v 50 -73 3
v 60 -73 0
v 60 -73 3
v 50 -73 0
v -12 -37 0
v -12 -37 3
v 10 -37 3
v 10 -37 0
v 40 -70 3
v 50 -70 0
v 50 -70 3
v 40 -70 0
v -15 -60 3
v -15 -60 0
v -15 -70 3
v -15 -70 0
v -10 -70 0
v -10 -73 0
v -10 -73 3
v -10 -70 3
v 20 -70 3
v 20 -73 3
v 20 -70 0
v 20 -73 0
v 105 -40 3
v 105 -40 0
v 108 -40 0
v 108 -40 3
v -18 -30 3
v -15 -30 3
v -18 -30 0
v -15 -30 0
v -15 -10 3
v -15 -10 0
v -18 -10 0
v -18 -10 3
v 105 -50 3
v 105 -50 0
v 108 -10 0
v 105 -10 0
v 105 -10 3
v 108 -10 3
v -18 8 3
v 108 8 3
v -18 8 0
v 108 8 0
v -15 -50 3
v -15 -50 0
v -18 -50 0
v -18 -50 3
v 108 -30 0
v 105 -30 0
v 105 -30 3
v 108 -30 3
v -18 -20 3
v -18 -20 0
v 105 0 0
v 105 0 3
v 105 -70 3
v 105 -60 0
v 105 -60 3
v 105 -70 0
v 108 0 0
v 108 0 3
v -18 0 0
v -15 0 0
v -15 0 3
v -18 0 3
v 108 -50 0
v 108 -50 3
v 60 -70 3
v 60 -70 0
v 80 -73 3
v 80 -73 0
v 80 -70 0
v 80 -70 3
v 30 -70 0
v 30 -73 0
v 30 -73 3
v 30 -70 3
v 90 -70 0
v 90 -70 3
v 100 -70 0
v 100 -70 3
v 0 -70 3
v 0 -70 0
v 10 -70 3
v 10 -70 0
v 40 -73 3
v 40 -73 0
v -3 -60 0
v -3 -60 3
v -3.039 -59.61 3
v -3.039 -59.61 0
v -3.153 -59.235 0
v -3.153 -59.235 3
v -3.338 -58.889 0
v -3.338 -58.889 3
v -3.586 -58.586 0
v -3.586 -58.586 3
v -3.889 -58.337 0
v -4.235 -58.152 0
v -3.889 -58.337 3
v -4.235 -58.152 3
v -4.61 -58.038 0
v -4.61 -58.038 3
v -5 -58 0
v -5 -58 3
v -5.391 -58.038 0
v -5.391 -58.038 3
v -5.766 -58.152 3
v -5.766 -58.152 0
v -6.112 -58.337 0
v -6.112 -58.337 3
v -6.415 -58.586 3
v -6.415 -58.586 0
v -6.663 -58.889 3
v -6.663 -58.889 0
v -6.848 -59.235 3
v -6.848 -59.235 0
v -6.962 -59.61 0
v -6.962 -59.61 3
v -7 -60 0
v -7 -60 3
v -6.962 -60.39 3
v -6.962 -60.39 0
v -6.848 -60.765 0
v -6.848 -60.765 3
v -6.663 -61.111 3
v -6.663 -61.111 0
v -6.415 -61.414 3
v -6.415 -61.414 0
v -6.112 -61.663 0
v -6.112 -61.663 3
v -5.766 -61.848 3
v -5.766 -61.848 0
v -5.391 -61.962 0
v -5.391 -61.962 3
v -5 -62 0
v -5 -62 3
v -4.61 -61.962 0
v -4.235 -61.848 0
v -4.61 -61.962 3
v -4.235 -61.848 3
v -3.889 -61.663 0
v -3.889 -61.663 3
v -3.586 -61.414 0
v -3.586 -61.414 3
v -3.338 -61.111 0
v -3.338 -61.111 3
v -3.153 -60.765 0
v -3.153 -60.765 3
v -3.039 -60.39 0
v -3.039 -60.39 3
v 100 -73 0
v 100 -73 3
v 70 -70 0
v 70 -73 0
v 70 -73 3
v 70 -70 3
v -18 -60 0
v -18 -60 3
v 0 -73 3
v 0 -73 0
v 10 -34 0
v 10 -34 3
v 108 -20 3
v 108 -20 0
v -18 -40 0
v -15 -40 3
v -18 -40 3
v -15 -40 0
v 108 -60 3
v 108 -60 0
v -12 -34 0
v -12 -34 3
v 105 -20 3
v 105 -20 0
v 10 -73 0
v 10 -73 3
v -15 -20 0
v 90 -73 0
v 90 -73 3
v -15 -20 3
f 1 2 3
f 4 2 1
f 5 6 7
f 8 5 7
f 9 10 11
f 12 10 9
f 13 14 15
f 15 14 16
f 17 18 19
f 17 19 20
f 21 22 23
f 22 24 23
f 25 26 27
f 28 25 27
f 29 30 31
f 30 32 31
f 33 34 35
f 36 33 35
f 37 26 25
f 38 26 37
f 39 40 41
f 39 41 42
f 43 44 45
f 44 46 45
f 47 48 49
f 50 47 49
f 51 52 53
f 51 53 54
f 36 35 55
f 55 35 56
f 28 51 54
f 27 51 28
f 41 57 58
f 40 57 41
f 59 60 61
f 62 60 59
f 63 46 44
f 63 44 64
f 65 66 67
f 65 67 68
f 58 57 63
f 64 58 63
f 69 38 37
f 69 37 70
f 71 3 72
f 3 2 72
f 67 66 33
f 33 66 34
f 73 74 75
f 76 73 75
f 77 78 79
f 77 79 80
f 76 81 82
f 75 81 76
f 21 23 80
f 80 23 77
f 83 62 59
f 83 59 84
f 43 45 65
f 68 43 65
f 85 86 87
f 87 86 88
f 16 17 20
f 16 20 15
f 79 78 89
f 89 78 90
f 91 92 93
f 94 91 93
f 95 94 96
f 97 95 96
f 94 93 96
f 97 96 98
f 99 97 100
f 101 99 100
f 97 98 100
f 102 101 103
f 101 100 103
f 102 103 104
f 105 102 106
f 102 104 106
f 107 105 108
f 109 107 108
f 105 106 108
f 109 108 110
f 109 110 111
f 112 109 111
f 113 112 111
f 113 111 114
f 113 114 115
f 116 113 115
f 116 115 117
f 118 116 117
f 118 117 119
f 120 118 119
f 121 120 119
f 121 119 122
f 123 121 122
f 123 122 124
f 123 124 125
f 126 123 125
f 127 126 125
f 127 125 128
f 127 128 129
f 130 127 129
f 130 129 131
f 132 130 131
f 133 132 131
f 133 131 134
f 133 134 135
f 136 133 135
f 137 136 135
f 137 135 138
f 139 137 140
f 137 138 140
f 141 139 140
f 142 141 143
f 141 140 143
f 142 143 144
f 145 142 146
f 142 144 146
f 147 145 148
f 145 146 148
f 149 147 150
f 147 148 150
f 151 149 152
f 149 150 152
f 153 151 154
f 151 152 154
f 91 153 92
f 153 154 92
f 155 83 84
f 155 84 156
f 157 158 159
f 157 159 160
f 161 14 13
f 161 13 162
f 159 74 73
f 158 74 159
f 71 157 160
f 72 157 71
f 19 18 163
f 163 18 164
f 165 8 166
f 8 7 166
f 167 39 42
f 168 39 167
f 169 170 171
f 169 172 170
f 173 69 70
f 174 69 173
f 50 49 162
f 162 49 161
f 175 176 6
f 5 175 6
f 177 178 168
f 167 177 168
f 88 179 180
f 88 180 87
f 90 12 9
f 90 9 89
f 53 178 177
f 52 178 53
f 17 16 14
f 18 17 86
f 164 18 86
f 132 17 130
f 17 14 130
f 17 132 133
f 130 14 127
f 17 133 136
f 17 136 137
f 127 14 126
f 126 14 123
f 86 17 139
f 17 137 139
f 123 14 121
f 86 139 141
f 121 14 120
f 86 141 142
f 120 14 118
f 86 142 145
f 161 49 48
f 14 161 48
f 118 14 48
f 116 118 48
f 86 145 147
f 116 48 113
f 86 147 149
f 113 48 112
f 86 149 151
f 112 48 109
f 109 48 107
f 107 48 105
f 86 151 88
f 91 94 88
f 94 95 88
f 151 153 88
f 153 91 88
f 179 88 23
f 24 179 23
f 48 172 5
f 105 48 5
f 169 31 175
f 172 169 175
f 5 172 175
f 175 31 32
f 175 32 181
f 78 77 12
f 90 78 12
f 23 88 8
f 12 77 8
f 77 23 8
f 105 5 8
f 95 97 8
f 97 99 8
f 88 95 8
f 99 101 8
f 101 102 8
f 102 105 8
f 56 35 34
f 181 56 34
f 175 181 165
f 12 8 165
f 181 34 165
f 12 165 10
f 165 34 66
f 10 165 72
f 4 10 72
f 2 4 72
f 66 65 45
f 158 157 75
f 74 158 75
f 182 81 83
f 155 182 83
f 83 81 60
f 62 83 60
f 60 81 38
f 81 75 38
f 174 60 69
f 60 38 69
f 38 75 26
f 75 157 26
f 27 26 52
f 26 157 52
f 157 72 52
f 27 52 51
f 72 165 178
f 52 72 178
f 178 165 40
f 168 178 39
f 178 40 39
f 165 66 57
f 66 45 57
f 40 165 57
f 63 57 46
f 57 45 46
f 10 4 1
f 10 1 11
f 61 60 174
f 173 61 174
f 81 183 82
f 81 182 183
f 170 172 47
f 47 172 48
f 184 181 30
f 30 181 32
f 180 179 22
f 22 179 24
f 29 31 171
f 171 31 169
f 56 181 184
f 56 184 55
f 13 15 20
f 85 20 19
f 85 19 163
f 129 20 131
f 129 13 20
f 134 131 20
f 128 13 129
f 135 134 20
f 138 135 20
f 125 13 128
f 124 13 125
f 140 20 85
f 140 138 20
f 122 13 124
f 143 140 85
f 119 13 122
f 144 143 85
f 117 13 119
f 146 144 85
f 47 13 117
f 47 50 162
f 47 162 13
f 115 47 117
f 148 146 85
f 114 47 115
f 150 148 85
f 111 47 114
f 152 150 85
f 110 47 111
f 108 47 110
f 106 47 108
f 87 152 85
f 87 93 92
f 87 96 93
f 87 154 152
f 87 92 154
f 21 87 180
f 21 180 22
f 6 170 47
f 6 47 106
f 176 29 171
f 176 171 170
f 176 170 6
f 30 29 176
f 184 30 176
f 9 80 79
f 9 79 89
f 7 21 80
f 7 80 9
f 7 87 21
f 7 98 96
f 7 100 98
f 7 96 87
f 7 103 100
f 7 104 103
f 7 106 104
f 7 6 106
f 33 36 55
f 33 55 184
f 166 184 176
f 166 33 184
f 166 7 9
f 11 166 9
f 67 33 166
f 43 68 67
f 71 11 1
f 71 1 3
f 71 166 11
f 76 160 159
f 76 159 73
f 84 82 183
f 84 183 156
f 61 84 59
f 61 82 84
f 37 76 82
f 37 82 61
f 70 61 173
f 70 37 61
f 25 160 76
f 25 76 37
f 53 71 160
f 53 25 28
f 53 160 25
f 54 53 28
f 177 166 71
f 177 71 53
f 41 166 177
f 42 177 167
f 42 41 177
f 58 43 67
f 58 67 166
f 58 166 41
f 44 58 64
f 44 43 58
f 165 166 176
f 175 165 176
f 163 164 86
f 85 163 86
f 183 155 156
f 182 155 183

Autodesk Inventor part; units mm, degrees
ref_plane "YZ Plane" through (0, 0, 0) normal (1, 0, 0) x (0, 1, 0)
ref_plane "XZ Plane" through (0, 0, 0) normal (0, 1, 0) x (-1, 0, 0)
ref_plane "XY Plane" through (0, 0, 0) normal (0, 0, 1) x (1, 0, 0)
ref_plane "Work Plane2" through (0, 0, 0) normal (0, 0, 1) x (1, 0, 0)
sketch "Sketch2" plane through (0, 0, 0) normal (0, 0, 1) x (1, 0, 0)
  line L0 (-13, 0) -> (-13, 3) projected
  line L1 (-13, 3) -> (-10, 3) projected
  line L2 (103, 0) -> (103, 3) projected
  line L3 (100, 3) -> (103, 3) projected
  line L4 (103, 8) -> (-13, 8)
  line L5 (-10, 0) -> (-10, 3) projected
  line L6 (-10, 3) -> (0, 3) projected
  line L7 (100, 0) -> (100, 3) projected
  line L8 (90, 3) -> (100, 3) projected
  line L9 (90, 3) -> (0, 3)
  line L10 (0, 0) -> (90, 0)
  line L11 (0, 0) -> (0, 3) projected
  line L12 (90, 0) -> (90, 3) projected
  line L13 (90, 3) -> (90, 0)
  line L14 (0, 3) -> (0, 0)
  line L15 (45, 0) -> (45, -20) construction
  line L16 (-15.0005, 0) -> (-15.0005, -10)
  line L17 (-15.0005, -10) -> (-18.0005, -10)
  line L18 (-15.0005, -20) -> (-18.0005, -20)
  line L19 (-15.0005, -20) -> (-15.0005, -30)
  line L20 (-15.0005, -30) -> (-18.0005, -30)
  line L21 (-15.0005, -40) -> (-18.0005, -40)
  line L22 (-15.0005, -50) -> (-18.0005, -50)
  line L23 (-15.0005, -60) -> (-18.0005, -60)
  line L24 (-18.0005, -10) -> (-18.0005, -20)
  line L25 (-18.0005, -30) -> (-18.0005, -40)
  line L26 (-18.0005, -50) -> (-18.0005, -60)
  line L27 (-15.0005, -40) -> (-15.0005, -50)
  line L28 (90, -73) -> (90, -70)
  line L29 (80, -73) -> (70, -73)
  line L30 (60, -73) -> (50, -73)
  line L31 (45, -70) -> (45, -47.72) construction
  line L32 (80, -73) -> (80, -70)
  line L33 (70, -73) -> (70, -70)
  line L34 (60, -73) -> (60, -70)
  line L35 (90, -70) -> (80, -70)
  line L36 (80, -73) -> (70, -73)
  line L37 (70, -70) -> (60, -70)
  line L38 (-10, -73) -> (0, -73)
  line L39 (0, -73) -> (0, -70)
  line L40 (10, -73) -> (20, -73)
  line L41 (10, -73) -> (10, -70)
  line L42 (20, -73) -> (20, -70)
  line L43 (30, -73) -> (30, -70)
  line L44 (0, -70) -> (10, -70)
  line L45 (20, -70) -> (30, -70)
  line L46 (60, -73) -> (50, -73)
  line L47 (50, -73) -> (50, -70)
  line L48 (50, -70) -> (45, -70)
  line L49 (45, -70) -> (40, -70)
  line L50 (40, -70) -> (40, -73)
  line L51 (30, -73) -> (40, -73)
  line L52 (50, -73) -> (77.2719, -73)
  line L53 (60, -73) -> (50, -73)
  line L54 (45, -70) -> (40, -70)
  line L55 (40, -73) -> (30, -73)
  line L56 (30, -70) -> (20, -70)
  line L57 (10, -70) -> (0, -70)
  line L58 (20, -73) -> (10, -73)
  line L59 (0, -73) -> (12.7281, -73)
  line L60 (-18, 8) -> (-13, 8)
  line L61 (-15.0005, 0) -> (-18, 0)
  line L62 (-15.0005, -60) -> (-15.0005, -70)
  line L63 (-18, -50) -> (-18, -60)
  line L64 (-18, -30) -> (-18, -40)
  line L65 (-18, 8) -> (-18, 0)
  line L66 (-18, -10) -> (-18, -20)
  line L67 (105.0005, 0) -> (105.0005, -10)
  line L68 (108.0005, -10) -> (108.0005, -20)
  line L69 (105.0005, -10) -> (108.0005, -10)
  line L70 (105.0005, -20) -> (108.0005, -20)
  line L71 (105.0005, -20) -> (105.0005, -30)
  line L72 (105.0005, -30) -> (108.0005, -30)
  line L73 (108.0005, -30) -> (108.0005, -40)
  line L74 (105.0005, -40) -> (108.0005, -40)
  line L75 (105.0005, -40) -> (105.0005, -50)
  line L76 (105.0005, -50) -> (108.0005, -50)
  line L77 (108.0005, -50) -> (108.0005, -60)
  line L78 (105.0005, -60) -> (108.0005, -60)
  line L79 (108, 8) -> (103, 8)
  line L80 (105.0005, 0) -> (108, 0)
  line L81 (105.0005, -60) -> (105.0005, -70)
  line L82 (108, -50) -> (108, -60)
  line L83 (108, -30) -> (108, -40)
  line L84 (108, 8) -> (108, 0)
  line L85 (108, -10) -> (108, -20)
  line L86 (100, -73) -> (90, -73)
  line L87 (0, -73) -> (-10, -73)
  line L88 (-10, -73) -> (-10, -70)
  line L89 (-10, -70) -> (-15.0005, -70)
  line L90 (-13, -73) -> (-10, -73)
  line L91 (100, -73) -> (98, -73)
  line L92 (90, -70) -> (100, -70)
  line L93 (100, -70) -> (100, -73)
  line L94 (105.0005, -70) -> (100, -70)
  dimension "d39" = 10
  dimension "d42" = 10
extrude "Extrusion1" add sketch "Sketch2" along normal blind 3 contours L79 L84 L80 L67 L69 L68 L70 L71 L72 L73 L74 L75 L76 L77 L78 L81 L94 L92 L35 L32 L29 L33 L37 L34 L30 L47 L48 L49 L50 L51 L43 L45 L42 L40 L41 L44 L39 L38 L88 L89 L62 L23 L26 L22 L27 L21 L25 L20 L19 L18 L24 L17 L16 L61 L65 L60 L4 | L93 L86 L28 L92 | L12 L10 L11 L9
sketch "Sketch3" plane through (0, 0, 3) normal (0, 0, 1) x (1, 0, 0)
  line L0 (0, -70) -> (10, -70) projected
  line L1 (-15.0005, -40) -> (-15.0005, -50) projected
  line L2 (-9.2505, -64.25) -> (7.7495, -64.25)
  line L3 (7.7495, -64.25) -> (7.7495, -55.25)
  line L4 (7.7495, -55.25) -> (-9.2505, -55.25)
  line L5 (-9.2505, -55.25) -> (-9.2505, -64.25)
  line L6 (16.5, -70) -> (16.5, 3) projected
  line L7 (13.5, 3) -> (13.5, -70) projected
  circle A0 centre (-5.0005, -60) radius 2
  line L8 (-15.0005, -60) -> (-15.0005, -70) projected
  line L9 (-15.0005, -70) -> (-10, -70) projected
  point P0 (0, 0)
  dimension "d57" = 17
  dimension "d58" = 9
  dimension "d59" = 5.75
  dimension "d60" = 5.75
  dimension "d61" = 4
  dimension "d62" = 10
  dimension "d63" = 10
extrude "Extrusion2" cut sketch "Sketch3" against normal blind 10 contours A0
sketch "Sketch4" plane through (0, 0, 3) normal (0, 0, 1) x (1, 0, 0)
  line L0 (-12, -37) -> (10, -37)
  line L1 (10, -37) -> (10, -34)
  line L2 (10, -34) -> (-12, -34)
  line L3 (-12, -34) -> (-12, -37)
  line L4 (108, 8) -> (-18, 8) projected
  line L5 (-18, -30) -> (-18, -40) projected
  dimension "d51" = 22
  dimension "d52" = 3
  dimension "d53" = 45
  dimension "d54" = 6
extrude "Extrusion3" cut sketch "Sketch4" against normal blind 10
properties part number "back"
